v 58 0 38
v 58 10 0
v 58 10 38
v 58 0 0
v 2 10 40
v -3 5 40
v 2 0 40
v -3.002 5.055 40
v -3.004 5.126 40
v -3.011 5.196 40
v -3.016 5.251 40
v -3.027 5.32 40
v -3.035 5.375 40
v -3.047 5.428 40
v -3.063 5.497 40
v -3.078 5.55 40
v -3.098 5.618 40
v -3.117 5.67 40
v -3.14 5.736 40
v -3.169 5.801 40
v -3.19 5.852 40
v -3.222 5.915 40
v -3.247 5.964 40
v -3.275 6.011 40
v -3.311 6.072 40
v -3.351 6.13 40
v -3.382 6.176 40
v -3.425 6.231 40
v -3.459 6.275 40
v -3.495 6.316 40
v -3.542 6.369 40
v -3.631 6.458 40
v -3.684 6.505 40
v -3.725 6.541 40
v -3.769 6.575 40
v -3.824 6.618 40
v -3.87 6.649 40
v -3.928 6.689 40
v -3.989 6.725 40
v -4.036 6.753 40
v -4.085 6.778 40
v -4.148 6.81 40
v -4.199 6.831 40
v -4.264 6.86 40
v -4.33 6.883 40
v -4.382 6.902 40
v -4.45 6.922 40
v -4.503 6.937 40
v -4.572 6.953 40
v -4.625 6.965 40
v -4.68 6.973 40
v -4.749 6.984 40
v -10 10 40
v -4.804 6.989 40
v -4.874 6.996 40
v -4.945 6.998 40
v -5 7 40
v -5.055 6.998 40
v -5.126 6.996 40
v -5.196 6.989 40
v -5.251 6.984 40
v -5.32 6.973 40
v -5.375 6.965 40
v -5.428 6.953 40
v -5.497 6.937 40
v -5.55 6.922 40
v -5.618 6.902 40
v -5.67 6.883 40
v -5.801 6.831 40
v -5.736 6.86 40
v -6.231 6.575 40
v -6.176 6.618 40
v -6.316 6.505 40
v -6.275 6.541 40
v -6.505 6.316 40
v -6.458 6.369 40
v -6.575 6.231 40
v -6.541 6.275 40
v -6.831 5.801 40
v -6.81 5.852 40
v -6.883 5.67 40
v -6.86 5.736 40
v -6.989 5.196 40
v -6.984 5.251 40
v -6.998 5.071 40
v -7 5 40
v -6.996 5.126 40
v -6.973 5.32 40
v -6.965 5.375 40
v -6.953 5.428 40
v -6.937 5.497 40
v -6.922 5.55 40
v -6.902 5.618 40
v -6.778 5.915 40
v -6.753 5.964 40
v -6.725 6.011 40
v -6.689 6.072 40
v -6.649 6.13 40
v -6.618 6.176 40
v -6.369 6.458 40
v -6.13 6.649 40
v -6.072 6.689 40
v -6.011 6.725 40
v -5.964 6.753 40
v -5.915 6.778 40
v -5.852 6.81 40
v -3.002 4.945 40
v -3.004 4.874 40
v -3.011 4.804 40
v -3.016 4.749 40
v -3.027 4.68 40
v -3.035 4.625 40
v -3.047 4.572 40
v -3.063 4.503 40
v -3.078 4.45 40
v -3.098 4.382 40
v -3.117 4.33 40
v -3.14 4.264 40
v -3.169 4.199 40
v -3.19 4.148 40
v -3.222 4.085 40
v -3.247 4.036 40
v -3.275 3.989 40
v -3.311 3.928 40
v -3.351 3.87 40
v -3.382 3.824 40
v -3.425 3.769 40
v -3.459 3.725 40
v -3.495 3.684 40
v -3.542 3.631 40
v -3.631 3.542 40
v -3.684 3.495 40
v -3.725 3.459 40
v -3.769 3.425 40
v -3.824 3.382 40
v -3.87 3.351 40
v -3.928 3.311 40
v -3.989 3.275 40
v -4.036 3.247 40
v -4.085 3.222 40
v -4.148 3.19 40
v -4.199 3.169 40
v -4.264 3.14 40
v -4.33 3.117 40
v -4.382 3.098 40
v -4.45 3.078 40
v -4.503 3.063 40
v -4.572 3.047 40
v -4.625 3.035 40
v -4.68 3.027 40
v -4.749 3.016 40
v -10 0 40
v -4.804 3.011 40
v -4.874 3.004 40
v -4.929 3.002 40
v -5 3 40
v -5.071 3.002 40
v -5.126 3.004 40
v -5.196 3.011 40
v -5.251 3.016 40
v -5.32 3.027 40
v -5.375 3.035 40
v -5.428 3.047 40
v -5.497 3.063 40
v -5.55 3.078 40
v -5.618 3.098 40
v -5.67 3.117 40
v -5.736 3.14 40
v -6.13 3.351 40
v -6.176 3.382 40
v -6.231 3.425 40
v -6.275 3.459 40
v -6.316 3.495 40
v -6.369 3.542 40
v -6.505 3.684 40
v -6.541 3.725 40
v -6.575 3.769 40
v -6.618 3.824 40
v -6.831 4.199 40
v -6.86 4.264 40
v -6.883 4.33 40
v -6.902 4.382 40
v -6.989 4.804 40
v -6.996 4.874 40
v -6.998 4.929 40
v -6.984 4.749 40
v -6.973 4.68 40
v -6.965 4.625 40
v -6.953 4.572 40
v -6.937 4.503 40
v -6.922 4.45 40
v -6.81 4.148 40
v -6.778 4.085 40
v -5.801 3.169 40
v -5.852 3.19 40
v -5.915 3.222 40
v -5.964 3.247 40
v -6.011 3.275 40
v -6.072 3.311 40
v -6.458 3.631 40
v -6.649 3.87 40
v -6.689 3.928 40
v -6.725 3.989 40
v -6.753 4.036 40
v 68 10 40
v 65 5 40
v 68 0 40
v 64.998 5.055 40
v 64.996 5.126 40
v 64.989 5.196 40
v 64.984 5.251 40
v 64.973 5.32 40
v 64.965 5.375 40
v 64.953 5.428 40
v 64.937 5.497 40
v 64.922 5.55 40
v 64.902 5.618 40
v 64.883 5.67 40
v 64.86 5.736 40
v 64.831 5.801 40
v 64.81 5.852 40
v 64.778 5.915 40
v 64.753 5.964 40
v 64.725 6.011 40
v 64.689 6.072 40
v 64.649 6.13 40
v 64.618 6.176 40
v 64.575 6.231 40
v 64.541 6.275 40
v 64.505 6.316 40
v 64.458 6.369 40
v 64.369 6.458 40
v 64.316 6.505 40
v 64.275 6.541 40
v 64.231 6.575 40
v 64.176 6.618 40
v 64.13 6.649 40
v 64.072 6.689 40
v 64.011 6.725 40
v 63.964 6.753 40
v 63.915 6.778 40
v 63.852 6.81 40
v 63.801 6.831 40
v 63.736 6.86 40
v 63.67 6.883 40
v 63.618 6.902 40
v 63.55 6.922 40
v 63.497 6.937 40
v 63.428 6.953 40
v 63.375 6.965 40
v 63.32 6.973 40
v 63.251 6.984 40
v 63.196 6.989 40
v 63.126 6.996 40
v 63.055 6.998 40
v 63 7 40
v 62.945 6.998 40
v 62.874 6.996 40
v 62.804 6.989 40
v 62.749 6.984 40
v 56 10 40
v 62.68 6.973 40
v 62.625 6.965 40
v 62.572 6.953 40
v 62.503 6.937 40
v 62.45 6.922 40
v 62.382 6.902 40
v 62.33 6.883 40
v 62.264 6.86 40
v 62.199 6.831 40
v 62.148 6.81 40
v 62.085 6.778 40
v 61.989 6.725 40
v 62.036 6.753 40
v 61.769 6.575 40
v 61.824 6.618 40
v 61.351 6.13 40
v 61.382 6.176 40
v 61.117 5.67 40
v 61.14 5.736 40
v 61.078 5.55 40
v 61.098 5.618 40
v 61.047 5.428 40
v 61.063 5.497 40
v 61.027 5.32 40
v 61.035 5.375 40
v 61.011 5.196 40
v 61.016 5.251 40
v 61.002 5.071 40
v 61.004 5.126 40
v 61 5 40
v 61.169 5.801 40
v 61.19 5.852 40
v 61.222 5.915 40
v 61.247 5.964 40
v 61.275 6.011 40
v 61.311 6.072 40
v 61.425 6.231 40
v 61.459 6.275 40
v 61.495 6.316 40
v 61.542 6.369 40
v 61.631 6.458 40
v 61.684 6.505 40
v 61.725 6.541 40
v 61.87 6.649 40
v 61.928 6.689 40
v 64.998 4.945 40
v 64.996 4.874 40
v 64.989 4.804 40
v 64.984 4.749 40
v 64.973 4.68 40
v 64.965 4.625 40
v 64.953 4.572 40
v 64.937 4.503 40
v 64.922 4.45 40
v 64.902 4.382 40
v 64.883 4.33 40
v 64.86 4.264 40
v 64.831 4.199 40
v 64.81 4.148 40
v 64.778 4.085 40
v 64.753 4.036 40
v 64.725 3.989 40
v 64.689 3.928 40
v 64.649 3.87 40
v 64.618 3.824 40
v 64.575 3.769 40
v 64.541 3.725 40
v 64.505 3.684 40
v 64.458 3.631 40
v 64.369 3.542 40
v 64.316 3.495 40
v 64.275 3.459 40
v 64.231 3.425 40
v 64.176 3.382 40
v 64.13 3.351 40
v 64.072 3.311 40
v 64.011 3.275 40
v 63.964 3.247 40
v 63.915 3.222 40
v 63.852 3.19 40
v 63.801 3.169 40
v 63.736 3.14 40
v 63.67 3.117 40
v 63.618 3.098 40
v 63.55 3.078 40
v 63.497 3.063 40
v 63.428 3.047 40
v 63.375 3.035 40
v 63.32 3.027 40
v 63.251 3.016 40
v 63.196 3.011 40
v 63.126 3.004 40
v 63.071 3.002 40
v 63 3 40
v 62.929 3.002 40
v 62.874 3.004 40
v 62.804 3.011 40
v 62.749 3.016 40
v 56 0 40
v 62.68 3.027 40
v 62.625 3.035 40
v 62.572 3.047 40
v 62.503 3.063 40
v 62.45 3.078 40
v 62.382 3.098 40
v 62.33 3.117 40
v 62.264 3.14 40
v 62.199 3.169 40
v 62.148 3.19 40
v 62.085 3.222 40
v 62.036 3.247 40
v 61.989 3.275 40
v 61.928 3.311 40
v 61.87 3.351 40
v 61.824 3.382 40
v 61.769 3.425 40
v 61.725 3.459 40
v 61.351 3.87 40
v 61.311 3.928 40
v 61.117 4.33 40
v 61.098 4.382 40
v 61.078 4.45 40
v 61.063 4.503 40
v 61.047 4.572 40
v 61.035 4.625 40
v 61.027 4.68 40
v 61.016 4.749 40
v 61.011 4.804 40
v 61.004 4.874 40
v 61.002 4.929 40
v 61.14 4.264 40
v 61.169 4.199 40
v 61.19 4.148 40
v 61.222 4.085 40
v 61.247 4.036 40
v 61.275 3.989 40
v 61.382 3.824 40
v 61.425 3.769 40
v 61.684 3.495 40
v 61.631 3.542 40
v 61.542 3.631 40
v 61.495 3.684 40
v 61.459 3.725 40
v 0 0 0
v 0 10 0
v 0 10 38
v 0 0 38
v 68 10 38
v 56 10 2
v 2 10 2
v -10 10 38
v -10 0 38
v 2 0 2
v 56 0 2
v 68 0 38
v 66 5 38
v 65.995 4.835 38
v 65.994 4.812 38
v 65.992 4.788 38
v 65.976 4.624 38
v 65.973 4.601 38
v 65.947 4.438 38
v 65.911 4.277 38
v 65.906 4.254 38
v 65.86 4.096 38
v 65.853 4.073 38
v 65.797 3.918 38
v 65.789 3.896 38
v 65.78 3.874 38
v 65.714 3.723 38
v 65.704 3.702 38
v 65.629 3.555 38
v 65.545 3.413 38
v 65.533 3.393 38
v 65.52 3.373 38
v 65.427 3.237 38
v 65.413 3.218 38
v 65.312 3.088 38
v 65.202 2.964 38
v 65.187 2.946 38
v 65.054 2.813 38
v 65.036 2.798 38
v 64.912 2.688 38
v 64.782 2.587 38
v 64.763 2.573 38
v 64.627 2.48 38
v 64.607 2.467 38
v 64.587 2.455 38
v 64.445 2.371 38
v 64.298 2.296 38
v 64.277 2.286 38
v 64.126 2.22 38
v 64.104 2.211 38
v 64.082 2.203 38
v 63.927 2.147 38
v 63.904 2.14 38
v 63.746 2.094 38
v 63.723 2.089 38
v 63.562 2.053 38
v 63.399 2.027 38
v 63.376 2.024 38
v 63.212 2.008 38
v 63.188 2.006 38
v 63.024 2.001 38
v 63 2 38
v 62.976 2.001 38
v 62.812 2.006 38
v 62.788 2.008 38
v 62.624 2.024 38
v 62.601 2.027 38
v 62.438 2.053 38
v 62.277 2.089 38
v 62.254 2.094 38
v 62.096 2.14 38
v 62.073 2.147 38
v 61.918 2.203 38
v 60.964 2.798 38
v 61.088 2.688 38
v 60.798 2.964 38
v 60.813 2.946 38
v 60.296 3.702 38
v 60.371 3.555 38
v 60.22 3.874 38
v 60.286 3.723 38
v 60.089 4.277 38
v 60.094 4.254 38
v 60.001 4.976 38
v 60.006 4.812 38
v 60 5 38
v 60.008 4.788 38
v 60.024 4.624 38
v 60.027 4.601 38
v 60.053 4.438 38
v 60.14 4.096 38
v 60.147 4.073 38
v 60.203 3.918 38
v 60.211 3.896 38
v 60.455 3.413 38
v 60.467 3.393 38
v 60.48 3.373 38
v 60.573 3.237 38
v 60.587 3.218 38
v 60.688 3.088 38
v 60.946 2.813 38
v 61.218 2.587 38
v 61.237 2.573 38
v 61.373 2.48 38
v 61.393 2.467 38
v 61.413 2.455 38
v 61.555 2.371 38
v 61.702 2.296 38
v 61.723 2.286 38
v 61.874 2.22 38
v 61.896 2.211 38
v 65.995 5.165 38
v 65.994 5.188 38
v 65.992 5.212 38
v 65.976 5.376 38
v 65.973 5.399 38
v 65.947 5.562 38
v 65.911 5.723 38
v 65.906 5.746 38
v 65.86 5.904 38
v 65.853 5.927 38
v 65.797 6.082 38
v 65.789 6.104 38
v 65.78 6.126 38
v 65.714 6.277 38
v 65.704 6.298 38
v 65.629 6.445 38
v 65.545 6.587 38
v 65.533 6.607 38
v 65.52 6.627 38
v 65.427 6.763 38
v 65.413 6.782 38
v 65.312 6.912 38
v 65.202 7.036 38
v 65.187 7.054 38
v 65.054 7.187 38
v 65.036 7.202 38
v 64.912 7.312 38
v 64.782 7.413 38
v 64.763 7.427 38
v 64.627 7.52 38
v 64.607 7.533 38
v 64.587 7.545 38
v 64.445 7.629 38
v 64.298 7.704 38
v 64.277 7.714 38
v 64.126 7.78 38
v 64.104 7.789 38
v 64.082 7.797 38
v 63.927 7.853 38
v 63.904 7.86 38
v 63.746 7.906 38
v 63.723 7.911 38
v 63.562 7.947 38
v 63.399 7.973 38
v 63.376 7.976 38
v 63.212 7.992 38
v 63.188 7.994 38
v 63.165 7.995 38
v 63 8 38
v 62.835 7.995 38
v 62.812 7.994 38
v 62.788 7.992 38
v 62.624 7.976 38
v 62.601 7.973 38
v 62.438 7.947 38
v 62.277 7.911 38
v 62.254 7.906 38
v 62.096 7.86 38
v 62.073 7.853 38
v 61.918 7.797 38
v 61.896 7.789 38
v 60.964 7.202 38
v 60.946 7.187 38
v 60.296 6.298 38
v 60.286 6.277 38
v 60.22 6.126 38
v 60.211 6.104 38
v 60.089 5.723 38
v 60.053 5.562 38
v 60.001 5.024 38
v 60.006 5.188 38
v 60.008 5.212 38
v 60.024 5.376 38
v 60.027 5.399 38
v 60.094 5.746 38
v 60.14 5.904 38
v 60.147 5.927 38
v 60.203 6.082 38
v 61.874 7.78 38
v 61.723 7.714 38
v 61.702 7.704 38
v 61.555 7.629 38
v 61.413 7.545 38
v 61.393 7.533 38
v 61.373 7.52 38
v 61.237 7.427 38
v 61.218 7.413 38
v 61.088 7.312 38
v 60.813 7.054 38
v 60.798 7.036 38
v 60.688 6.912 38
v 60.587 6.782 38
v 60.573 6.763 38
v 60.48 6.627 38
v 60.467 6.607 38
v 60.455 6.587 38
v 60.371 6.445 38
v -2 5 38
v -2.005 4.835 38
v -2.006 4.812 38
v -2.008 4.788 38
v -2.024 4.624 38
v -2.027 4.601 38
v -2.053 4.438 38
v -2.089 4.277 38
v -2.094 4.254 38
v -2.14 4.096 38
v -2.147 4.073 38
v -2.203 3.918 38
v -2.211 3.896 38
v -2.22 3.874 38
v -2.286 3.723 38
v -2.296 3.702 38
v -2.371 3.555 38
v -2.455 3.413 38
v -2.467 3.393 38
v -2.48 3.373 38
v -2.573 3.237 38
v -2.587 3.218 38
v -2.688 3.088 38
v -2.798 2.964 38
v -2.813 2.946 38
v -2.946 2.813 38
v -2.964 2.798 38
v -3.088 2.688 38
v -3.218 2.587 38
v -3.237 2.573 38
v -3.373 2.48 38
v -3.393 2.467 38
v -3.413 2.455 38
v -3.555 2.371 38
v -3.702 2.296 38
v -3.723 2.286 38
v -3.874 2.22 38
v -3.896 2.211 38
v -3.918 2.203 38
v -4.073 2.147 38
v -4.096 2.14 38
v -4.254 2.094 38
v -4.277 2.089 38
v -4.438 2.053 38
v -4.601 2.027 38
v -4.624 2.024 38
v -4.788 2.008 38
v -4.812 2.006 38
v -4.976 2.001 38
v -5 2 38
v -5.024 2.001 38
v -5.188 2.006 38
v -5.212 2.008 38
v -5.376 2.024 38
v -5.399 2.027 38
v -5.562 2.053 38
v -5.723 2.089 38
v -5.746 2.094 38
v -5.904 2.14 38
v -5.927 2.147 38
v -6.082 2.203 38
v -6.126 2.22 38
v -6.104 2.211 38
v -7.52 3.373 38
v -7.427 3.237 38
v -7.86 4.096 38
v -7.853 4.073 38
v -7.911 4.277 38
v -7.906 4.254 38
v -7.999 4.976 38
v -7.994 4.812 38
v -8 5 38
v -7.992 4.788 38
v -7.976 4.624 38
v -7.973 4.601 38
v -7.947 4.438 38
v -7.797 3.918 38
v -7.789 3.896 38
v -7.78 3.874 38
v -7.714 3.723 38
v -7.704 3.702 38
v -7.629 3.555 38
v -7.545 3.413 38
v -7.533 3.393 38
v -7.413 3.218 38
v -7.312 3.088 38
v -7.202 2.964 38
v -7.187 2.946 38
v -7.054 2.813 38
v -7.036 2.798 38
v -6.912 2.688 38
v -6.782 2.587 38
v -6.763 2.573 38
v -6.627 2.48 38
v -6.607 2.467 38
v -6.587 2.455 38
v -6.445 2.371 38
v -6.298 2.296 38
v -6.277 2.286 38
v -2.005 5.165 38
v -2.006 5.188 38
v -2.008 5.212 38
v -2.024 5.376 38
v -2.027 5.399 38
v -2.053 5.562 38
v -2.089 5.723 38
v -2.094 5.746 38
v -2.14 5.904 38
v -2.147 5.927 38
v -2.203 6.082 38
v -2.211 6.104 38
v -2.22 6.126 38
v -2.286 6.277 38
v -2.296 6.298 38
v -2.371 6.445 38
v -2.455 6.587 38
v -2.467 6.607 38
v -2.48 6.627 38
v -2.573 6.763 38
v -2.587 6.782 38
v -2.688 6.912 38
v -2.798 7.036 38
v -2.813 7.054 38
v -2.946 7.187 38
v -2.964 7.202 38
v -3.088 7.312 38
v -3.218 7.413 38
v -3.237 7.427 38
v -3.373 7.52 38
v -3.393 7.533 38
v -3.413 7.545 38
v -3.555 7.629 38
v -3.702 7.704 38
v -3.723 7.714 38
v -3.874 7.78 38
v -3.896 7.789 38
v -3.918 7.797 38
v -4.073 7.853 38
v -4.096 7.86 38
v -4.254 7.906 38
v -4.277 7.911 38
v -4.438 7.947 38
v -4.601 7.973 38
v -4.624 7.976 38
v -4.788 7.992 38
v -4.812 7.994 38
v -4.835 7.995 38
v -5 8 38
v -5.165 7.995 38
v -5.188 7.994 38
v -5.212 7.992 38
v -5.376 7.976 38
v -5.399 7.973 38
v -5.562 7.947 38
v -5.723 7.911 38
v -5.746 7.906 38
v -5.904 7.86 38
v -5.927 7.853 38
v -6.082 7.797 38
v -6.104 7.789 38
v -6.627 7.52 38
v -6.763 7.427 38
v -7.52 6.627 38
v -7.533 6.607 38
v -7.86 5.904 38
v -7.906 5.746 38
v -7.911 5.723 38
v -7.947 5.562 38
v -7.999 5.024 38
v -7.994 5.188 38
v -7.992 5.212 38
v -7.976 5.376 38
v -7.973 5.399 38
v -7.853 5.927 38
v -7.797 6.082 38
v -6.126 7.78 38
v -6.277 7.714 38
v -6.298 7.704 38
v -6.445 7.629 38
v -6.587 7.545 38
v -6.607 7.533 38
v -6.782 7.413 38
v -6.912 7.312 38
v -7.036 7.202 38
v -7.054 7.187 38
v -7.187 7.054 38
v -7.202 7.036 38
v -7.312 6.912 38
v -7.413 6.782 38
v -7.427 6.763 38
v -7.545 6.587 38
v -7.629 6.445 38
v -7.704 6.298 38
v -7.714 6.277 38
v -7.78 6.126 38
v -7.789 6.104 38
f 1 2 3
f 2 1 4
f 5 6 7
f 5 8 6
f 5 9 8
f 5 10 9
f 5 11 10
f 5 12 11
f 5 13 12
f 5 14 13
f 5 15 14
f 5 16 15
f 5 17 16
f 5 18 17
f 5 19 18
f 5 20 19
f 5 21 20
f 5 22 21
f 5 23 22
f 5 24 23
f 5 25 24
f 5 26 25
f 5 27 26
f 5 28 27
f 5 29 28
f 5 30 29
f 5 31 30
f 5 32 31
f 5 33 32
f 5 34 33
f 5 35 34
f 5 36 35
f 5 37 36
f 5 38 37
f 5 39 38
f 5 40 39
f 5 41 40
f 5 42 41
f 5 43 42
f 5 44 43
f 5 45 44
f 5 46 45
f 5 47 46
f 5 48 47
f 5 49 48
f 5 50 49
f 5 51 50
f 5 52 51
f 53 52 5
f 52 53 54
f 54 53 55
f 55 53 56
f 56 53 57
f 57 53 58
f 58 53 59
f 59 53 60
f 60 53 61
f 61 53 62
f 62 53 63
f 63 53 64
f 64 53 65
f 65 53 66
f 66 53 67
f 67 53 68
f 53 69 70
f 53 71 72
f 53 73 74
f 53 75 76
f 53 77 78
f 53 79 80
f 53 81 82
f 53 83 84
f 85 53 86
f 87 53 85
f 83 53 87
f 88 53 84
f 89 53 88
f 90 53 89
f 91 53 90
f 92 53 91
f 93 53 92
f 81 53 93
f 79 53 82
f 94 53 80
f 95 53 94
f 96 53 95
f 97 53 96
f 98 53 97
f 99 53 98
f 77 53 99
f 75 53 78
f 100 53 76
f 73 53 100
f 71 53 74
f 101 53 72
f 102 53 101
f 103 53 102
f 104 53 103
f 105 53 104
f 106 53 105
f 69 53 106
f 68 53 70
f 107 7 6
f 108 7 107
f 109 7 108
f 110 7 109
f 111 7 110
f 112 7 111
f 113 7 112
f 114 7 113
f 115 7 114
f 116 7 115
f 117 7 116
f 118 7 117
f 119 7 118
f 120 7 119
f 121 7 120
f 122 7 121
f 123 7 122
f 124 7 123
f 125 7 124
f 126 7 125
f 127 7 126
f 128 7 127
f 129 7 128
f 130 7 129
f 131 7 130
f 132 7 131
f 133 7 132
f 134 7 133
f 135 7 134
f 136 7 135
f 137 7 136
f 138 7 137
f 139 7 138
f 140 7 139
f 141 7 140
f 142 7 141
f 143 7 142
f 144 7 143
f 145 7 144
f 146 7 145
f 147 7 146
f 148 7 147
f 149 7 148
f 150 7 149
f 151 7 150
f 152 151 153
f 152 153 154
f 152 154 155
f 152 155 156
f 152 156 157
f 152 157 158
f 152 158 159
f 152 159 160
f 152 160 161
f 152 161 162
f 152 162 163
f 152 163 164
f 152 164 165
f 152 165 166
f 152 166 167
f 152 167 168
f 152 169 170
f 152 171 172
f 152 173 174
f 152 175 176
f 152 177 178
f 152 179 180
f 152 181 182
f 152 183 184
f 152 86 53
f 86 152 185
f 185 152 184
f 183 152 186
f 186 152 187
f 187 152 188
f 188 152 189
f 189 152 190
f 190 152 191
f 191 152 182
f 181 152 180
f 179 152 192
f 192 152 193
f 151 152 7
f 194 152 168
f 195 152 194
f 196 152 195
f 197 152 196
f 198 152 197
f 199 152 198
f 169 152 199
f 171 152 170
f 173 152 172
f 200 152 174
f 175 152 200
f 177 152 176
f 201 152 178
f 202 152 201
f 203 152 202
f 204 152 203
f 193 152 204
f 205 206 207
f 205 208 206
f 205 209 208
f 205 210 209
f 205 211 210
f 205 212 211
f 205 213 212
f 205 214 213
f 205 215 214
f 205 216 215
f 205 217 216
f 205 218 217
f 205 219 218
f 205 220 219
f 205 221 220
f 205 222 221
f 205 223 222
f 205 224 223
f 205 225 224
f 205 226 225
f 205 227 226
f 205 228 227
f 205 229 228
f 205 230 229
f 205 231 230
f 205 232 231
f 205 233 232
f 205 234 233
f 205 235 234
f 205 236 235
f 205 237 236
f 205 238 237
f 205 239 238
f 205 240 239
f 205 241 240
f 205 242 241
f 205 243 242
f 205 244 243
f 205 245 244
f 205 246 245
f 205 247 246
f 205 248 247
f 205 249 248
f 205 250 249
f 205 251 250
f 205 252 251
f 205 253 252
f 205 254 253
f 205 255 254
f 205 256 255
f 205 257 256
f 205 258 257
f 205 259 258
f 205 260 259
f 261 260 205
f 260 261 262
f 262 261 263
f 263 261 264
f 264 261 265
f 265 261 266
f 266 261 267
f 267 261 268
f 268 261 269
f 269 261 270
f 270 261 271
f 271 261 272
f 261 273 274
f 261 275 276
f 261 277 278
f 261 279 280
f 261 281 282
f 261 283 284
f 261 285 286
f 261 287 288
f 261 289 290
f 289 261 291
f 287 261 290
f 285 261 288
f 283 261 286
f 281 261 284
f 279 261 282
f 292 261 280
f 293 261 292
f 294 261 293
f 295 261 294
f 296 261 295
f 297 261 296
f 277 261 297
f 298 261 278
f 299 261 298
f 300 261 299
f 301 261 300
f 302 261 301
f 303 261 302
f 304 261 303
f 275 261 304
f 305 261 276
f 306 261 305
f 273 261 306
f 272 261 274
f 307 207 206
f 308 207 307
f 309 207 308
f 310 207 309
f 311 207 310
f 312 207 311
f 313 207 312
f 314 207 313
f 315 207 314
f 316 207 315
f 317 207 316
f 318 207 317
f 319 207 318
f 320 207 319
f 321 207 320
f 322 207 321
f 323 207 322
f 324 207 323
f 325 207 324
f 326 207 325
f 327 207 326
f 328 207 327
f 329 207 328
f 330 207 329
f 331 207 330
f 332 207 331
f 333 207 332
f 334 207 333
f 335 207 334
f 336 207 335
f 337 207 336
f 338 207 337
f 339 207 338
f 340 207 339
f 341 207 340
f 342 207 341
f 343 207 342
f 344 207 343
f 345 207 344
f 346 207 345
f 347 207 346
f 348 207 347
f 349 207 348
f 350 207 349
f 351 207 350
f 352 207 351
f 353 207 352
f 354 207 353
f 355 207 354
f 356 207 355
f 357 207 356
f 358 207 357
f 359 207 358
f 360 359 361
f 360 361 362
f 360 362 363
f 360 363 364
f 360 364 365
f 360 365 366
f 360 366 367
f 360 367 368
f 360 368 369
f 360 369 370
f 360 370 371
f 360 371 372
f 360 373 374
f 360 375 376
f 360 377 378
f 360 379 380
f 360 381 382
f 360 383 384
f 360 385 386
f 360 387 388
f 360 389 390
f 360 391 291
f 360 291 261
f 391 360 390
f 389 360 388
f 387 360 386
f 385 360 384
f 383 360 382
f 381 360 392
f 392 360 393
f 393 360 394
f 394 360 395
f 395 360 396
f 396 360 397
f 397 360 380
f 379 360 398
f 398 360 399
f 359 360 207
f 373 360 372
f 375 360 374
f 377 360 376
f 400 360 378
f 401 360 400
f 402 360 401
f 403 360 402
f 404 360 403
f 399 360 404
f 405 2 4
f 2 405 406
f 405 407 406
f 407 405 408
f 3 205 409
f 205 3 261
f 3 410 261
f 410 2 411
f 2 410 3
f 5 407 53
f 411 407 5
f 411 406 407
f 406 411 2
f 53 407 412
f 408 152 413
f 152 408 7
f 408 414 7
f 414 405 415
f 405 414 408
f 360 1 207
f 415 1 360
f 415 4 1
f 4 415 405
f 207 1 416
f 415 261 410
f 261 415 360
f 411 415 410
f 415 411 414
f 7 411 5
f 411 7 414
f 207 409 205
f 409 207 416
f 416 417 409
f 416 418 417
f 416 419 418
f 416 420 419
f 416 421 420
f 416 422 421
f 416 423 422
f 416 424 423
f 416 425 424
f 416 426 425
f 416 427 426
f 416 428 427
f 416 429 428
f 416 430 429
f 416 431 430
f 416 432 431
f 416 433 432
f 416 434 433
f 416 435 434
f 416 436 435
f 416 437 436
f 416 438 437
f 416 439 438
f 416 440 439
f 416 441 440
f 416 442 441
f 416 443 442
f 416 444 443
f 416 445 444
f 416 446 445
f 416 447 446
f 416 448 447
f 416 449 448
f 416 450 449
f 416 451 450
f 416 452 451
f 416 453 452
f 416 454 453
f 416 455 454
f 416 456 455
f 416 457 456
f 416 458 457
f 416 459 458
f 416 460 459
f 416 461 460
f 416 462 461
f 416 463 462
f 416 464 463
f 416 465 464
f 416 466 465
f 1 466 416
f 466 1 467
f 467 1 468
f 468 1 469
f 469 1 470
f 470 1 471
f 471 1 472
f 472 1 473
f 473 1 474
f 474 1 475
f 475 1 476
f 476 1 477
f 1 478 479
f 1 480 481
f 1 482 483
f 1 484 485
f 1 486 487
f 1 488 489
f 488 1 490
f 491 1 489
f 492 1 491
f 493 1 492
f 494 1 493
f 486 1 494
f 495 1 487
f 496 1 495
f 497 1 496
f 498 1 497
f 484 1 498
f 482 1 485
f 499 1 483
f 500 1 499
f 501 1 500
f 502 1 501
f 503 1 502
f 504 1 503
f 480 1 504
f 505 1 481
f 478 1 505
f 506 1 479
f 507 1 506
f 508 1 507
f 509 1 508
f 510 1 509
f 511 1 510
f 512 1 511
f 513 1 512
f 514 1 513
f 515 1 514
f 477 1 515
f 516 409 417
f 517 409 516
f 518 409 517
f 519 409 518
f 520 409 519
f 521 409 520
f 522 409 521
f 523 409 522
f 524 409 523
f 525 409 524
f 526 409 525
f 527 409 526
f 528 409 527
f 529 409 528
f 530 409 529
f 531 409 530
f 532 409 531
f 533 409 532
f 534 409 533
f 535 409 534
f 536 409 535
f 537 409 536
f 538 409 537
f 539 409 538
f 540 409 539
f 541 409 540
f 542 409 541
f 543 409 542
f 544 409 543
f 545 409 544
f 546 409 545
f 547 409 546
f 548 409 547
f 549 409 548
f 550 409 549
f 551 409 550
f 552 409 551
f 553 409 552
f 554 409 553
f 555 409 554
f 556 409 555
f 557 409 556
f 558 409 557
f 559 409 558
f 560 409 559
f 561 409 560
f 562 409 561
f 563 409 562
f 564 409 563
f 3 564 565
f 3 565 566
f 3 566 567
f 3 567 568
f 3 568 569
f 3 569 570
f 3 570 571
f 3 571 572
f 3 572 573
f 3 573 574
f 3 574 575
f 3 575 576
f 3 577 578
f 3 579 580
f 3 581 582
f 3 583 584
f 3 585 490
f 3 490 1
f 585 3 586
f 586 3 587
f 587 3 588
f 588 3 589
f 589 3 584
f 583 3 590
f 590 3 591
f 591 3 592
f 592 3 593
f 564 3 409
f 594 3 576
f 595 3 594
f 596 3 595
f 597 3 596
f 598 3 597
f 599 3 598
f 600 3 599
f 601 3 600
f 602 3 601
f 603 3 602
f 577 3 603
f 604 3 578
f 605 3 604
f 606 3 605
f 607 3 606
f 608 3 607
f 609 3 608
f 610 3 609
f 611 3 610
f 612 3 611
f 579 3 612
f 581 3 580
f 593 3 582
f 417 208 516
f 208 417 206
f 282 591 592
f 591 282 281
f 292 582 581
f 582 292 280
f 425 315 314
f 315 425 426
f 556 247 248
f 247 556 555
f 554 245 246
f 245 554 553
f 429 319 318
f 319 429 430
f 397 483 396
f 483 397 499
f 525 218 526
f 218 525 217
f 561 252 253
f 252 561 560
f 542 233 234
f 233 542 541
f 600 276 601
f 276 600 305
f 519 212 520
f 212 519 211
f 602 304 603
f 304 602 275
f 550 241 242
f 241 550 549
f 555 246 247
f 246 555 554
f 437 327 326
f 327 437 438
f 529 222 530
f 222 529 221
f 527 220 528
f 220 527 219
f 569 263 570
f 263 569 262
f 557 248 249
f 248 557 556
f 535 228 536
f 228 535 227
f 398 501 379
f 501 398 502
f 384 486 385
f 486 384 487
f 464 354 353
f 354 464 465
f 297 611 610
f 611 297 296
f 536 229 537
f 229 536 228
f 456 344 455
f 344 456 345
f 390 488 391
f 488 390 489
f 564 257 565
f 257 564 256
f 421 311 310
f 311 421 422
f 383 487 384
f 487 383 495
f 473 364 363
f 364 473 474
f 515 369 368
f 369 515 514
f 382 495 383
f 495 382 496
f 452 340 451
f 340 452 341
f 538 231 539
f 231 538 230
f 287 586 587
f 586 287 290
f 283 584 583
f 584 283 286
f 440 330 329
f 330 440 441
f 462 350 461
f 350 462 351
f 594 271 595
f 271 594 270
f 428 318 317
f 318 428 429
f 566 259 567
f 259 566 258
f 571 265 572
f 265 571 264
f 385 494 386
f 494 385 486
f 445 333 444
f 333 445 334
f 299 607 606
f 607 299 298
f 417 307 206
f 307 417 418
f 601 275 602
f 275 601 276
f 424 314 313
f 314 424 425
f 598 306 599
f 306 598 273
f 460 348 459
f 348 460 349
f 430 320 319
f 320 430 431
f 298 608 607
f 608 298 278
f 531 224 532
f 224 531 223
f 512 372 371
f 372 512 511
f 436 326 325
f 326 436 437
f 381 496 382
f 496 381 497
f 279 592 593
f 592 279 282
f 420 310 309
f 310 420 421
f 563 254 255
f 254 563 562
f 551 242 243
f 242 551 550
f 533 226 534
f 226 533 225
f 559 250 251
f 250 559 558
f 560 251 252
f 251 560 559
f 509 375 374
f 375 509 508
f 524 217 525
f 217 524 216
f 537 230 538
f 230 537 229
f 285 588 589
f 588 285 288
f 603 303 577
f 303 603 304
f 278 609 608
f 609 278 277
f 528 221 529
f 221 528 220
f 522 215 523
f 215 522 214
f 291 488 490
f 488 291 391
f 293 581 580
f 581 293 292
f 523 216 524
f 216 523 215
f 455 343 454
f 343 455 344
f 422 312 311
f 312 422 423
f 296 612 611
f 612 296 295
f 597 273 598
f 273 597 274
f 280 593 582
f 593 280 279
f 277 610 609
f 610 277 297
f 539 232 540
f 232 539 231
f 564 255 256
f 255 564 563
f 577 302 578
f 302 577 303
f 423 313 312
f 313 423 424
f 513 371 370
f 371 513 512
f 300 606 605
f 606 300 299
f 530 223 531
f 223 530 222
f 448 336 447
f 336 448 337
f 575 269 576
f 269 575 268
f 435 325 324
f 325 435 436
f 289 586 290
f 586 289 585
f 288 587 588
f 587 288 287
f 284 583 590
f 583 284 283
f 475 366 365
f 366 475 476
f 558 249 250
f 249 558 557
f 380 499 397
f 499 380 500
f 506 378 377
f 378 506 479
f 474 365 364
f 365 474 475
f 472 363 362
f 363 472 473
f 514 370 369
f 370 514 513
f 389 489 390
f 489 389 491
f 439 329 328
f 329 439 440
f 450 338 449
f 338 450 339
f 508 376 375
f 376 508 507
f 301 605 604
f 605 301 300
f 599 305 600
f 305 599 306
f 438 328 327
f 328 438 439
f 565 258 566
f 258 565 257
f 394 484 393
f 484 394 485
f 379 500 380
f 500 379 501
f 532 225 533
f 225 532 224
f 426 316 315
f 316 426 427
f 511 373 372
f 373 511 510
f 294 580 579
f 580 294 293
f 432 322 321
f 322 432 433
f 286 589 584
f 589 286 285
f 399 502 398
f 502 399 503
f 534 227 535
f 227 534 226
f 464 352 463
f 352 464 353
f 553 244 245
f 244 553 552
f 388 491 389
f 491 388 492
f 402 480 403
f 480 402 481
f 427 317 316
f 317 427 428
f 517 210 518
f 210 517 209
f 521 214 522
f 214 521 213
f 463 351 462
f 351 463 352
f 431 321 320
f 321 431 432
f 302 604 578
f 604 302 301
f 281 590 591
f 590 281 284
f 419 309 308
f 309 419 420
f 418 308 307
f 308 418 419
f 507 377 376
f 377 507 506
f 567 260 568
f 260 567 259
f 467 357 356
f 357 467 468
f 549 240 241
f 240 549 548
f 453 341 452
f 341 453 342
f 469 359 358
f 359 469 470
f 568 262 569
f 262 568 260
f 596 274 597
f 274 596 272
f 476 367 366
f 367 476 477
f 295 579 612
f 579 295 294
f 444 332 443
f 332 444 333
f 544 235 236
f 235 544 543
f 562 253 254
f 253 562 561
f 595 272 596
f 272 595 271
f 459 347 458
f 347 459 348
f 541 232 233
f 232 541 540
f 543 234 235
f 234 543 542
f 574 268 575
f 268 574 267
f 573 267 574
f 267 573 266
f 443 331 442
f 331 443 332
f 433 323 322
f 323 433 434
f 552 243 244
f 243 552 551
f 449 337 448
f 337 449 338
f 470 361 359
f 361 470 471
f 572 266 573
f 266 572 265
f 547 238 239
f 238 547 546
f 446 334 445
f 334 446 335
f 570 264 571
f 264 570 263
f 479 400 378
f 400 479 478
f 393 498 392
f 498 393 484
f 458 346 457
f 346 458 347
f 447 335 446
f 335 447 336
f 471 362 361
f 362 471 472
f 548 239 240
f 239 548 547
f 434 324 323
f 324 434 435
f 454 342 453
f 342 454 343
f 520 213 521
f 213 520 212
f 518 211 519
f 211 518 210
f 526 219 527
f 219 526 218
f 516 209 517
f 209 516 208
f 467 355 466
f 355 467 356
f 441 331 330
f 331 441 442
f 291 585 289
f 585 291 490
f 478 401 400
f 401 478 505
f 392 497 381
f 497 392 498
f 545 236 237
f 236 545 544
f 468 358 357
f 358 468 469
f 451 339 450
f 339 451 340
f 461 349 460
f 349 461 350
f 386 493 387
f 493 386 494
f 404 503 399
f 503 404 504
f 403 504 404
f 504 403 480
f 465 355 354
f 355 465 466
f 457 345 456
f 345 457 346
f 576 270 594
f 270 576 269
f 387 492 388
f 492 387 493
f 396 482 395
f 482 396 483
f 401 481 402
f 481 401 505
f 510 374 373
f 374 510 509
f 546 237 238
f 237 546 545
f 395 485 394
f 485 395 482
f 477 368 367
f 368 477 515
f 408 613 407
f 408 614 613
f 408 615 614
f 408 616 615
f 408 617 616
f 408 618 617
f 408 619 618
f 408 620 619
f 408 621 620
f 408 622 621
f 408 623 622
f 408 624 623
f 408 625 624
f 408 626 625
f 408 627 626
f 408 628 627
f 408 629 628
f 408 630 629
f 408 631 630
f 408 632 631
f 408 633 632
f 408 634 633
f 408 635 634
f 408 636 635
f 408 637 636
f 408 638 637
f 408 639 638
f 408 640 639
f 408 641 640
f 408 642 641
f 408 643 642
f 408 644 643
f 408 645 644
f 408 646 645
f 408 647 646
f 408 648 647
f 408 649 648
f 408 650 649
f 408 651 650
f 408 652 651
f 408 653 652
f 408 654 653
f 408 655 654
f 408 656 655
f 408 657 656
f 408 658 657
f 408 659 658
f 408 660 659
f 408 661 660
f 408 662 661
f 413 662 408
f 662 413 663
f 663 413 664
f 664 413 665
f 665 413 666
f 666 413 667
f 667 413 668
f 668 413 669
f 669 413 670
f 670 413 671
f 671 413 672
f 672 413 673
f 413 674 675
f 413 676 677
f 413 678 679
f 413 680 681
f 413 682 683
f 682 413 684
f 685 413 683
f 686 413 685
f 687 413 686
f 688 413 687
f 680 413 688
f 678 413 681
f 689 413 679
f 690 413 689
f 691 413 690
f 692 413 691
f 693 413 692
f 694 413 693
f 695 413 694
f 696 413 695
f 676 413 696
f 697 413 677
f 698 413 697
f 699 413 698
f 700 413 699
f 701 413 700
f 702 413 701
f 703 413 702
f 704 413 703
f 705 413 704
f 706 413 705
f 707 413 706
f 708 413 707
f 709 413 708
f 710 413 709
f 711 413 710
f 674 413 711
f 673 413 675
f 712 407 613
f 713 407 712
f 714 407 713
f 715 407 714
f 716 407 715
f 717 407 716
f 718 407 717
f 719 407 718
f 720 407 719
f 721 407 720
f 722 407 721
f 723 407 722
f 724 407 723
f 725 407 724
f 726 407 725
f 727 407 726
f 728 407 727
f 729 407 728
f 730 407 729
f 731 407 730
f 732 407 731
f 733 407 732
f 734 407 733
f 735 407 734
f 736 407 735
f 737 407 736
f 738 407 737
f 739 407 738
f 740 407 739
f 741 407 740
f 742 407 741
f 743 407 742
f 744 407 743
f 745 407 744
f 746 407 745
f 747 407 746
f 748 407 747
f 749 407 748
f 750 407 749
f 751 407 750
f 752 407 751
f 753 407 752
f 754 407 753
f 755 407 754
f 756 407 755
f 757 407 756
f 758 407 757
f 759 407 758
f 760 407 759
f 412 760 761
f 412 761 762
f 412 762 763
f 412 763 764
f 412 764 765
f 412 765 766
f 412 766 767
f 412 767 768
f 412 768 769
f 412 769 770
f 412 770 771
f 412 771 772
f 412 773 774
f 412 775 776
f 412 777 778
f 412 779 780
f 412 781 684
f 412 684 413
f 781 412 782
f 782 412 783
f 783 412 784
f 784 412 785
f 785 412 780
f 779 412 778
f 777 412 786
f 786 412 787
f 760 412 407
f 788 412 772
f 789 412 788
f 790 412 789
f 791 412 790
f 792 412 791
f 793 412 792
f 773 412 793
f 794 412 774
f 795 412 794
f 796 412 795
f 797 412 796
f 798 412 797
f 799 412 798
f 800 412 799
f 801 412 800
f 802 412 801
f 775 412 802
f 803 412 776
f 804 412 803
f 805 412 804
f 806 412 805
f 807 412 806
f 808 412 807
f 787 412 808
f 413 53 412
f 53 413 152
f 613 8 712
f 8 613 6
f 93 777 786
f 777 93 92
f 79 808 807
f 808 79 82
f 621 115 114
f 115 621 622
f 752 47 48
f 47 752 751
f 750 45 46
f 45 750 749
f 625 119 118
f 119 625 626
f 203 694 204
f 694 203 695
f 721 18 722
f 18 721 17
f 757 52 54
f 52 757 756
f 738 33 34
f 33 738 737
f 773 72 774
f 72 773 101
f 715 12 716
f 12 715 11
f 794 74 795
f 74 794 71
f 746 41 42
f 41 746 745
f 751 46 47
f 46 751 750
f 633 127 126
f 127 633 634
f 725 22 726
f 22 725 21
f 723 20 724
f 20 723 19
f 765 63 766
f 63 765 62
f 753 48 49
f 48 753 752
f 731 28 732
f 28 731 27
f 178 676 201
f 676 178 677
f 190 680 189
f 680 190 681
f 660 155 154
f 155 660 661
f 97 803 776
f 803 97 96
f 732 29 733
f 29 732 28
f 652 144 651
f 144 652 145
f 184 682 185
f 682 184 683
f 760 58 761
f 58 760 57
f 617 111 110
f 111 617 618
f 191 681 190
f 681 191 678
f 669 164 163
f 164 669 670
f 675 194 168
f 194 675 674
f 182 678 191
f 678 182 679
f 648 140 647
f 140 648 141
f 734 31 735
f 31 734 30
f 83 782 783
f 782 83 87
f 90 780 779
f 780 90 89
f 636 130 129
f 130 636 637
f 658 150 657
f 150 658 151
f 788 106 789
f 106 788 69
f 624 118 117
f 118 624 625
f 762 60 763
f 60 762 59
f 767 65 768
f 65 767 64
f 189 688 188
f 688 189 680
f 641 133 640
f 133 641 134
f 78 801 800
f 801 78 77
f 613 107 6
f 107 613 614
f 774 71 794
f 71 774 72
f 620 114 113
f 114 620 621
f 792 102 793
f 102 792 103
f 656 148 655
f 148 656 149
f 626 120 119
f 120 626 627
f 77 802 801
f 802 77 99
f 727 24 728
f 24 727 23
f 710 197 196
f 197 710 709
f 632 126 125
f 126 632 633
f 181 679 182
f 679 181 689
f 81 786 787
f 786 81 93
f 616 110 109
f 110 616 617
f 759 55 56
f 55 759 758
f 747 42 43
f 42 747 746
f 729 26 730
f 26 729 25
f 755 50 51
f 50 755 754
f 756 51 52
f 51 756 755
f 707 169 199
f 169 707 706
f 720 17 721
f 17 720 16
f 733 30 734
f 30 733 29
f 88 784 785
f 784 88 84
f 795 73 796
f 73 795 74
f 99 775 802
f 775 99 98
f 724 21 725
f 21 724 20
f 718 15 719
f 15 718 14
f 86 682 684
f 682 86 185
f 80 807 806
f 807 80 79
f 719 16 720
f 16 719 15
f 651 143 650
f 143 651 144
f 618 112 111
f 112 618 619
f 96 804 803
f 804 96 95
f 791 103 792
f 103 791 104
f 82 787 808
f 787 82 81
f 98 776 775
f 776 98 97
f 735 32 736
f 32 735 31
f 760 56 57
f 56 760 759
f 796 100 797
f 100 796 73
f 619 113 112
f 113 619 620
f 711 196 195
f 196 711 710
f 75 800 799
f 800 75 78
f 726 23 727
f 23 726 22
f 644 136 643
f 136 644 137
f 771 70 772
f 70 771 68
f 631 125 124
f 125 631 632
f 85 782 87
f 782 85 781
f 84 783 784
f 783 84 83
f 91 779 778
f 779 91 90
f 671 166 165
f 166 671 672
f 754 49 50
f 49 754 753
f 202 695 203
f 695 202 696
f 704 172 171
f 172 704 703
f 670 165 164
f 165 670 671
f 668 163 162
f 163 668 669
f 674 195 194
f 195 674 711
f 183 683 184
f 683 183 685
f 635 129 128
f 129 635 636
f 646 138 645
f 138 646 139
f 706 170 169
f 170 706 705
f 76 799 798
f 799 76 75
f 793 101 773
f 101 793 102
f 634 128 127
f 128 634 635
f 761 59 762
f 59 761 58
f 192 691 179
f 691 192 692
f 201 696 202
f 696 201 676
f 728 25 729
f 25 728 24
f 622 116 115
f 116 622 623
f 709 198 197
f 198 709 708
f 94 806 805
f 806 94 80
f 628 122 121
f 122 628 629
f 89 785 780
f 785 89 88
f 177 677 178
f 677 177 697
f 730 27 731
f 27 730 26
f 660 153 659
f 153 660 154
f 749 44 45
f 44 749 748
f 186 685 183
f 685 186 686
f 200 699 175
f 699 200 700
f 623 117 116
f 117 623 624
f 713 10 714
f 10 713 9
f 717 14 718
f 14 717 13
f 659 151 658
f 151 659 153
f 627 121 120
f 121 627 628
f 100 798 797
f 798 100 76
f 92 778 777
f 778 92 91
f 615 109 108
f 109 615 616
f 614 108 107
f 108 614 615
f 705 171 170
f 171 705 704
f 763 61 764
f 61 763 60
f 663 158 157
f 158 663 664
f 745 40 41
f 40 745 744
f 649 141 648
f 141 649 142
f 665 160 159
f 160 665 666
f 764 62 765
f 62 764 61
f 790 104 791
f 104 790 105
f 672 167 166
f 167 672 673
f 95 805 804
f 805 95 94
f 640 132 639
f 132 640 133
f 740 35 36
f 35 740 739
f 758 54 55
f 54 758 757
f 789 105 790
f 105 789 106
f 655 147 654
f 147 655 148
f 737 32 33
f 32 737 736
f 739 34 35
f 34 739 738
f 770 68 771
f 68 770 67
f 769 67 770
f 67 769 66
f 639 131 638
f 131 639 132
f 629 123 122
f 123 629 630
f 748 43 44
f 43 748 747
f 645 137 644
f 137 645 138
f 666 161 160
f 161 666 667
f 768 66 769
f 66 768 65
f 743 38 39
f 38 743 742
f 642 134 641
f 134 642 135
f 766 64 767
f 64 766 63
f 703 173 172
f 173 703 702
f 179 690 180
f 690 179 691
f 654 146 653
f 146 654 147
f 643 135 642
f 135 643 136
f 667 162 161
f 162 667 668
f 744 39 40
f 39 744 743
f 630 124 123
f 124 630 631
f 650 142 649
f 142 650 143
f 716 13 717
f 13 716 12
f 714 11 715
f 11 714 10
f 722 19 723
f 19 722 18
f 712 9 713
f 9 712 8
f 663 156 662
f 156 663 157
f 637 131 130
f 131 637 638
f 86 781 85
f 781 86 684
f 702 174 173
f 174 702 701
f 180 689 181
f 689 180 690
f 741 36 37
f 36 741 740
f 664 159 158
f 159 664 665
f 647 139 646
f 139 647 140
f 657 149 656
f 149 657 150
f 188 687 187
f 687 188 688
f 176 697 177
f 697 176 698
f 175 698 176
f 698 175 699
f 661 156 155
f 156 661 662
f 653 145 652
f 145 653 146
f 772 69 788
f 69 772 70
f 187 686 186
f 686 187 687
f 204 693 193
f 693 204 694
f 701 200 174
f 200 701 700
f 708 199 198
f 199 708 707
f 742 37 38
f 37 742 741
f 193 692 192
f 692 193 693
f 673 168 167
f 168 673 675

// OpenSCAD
$fn = 100;

/*
 * Basic U shape screwable holder :
 *
 *           _______                    _______
 *          /__O__ /|                  /__O__ /
 *                 ||__________________||         ↑h
 *      d/         |/__________________|/         ↓
 *
 *                 ←-------- w -------→
 *
 * s (mm) : Screw diameter (default 4 mm)
 * h (mm) : Height
 * w (mm) : Width
 * d (mm) : Depth
 * t (mm) : Thickness of the plastic
 *
 * The dimensions are interior ones, meaning if w=10 and t=1, external width of the hook is 12 = w + 2 * t
 */
module screwableHolder(h, w, d, t = 2, s = 4) {
    difference() {
        cube([w + 2 * t, d, h + t]);
        translate([t, - 1, t]) cube([w, d + 2, h + 1]);
    }
    translate([w + 2 * t, 0, h]) screwBar(d = d, t = t, s = s);
    translate([- (s + 3 * t), 0, h]) screwBar(d = d, t = t, s = s);
}

module screwBar(d, t, s) {
    width = s + 3 * t;
    difference() {
        cube([width, d, t]);
        translate([width / 2, d / 2, - 1]) cylinder(h = t + 2, r1 = (s + t + 1) / 2, r2 = (s - 1) / 2);
    }
}

screwableHolder(h = 38, w = 54, d = 10);
